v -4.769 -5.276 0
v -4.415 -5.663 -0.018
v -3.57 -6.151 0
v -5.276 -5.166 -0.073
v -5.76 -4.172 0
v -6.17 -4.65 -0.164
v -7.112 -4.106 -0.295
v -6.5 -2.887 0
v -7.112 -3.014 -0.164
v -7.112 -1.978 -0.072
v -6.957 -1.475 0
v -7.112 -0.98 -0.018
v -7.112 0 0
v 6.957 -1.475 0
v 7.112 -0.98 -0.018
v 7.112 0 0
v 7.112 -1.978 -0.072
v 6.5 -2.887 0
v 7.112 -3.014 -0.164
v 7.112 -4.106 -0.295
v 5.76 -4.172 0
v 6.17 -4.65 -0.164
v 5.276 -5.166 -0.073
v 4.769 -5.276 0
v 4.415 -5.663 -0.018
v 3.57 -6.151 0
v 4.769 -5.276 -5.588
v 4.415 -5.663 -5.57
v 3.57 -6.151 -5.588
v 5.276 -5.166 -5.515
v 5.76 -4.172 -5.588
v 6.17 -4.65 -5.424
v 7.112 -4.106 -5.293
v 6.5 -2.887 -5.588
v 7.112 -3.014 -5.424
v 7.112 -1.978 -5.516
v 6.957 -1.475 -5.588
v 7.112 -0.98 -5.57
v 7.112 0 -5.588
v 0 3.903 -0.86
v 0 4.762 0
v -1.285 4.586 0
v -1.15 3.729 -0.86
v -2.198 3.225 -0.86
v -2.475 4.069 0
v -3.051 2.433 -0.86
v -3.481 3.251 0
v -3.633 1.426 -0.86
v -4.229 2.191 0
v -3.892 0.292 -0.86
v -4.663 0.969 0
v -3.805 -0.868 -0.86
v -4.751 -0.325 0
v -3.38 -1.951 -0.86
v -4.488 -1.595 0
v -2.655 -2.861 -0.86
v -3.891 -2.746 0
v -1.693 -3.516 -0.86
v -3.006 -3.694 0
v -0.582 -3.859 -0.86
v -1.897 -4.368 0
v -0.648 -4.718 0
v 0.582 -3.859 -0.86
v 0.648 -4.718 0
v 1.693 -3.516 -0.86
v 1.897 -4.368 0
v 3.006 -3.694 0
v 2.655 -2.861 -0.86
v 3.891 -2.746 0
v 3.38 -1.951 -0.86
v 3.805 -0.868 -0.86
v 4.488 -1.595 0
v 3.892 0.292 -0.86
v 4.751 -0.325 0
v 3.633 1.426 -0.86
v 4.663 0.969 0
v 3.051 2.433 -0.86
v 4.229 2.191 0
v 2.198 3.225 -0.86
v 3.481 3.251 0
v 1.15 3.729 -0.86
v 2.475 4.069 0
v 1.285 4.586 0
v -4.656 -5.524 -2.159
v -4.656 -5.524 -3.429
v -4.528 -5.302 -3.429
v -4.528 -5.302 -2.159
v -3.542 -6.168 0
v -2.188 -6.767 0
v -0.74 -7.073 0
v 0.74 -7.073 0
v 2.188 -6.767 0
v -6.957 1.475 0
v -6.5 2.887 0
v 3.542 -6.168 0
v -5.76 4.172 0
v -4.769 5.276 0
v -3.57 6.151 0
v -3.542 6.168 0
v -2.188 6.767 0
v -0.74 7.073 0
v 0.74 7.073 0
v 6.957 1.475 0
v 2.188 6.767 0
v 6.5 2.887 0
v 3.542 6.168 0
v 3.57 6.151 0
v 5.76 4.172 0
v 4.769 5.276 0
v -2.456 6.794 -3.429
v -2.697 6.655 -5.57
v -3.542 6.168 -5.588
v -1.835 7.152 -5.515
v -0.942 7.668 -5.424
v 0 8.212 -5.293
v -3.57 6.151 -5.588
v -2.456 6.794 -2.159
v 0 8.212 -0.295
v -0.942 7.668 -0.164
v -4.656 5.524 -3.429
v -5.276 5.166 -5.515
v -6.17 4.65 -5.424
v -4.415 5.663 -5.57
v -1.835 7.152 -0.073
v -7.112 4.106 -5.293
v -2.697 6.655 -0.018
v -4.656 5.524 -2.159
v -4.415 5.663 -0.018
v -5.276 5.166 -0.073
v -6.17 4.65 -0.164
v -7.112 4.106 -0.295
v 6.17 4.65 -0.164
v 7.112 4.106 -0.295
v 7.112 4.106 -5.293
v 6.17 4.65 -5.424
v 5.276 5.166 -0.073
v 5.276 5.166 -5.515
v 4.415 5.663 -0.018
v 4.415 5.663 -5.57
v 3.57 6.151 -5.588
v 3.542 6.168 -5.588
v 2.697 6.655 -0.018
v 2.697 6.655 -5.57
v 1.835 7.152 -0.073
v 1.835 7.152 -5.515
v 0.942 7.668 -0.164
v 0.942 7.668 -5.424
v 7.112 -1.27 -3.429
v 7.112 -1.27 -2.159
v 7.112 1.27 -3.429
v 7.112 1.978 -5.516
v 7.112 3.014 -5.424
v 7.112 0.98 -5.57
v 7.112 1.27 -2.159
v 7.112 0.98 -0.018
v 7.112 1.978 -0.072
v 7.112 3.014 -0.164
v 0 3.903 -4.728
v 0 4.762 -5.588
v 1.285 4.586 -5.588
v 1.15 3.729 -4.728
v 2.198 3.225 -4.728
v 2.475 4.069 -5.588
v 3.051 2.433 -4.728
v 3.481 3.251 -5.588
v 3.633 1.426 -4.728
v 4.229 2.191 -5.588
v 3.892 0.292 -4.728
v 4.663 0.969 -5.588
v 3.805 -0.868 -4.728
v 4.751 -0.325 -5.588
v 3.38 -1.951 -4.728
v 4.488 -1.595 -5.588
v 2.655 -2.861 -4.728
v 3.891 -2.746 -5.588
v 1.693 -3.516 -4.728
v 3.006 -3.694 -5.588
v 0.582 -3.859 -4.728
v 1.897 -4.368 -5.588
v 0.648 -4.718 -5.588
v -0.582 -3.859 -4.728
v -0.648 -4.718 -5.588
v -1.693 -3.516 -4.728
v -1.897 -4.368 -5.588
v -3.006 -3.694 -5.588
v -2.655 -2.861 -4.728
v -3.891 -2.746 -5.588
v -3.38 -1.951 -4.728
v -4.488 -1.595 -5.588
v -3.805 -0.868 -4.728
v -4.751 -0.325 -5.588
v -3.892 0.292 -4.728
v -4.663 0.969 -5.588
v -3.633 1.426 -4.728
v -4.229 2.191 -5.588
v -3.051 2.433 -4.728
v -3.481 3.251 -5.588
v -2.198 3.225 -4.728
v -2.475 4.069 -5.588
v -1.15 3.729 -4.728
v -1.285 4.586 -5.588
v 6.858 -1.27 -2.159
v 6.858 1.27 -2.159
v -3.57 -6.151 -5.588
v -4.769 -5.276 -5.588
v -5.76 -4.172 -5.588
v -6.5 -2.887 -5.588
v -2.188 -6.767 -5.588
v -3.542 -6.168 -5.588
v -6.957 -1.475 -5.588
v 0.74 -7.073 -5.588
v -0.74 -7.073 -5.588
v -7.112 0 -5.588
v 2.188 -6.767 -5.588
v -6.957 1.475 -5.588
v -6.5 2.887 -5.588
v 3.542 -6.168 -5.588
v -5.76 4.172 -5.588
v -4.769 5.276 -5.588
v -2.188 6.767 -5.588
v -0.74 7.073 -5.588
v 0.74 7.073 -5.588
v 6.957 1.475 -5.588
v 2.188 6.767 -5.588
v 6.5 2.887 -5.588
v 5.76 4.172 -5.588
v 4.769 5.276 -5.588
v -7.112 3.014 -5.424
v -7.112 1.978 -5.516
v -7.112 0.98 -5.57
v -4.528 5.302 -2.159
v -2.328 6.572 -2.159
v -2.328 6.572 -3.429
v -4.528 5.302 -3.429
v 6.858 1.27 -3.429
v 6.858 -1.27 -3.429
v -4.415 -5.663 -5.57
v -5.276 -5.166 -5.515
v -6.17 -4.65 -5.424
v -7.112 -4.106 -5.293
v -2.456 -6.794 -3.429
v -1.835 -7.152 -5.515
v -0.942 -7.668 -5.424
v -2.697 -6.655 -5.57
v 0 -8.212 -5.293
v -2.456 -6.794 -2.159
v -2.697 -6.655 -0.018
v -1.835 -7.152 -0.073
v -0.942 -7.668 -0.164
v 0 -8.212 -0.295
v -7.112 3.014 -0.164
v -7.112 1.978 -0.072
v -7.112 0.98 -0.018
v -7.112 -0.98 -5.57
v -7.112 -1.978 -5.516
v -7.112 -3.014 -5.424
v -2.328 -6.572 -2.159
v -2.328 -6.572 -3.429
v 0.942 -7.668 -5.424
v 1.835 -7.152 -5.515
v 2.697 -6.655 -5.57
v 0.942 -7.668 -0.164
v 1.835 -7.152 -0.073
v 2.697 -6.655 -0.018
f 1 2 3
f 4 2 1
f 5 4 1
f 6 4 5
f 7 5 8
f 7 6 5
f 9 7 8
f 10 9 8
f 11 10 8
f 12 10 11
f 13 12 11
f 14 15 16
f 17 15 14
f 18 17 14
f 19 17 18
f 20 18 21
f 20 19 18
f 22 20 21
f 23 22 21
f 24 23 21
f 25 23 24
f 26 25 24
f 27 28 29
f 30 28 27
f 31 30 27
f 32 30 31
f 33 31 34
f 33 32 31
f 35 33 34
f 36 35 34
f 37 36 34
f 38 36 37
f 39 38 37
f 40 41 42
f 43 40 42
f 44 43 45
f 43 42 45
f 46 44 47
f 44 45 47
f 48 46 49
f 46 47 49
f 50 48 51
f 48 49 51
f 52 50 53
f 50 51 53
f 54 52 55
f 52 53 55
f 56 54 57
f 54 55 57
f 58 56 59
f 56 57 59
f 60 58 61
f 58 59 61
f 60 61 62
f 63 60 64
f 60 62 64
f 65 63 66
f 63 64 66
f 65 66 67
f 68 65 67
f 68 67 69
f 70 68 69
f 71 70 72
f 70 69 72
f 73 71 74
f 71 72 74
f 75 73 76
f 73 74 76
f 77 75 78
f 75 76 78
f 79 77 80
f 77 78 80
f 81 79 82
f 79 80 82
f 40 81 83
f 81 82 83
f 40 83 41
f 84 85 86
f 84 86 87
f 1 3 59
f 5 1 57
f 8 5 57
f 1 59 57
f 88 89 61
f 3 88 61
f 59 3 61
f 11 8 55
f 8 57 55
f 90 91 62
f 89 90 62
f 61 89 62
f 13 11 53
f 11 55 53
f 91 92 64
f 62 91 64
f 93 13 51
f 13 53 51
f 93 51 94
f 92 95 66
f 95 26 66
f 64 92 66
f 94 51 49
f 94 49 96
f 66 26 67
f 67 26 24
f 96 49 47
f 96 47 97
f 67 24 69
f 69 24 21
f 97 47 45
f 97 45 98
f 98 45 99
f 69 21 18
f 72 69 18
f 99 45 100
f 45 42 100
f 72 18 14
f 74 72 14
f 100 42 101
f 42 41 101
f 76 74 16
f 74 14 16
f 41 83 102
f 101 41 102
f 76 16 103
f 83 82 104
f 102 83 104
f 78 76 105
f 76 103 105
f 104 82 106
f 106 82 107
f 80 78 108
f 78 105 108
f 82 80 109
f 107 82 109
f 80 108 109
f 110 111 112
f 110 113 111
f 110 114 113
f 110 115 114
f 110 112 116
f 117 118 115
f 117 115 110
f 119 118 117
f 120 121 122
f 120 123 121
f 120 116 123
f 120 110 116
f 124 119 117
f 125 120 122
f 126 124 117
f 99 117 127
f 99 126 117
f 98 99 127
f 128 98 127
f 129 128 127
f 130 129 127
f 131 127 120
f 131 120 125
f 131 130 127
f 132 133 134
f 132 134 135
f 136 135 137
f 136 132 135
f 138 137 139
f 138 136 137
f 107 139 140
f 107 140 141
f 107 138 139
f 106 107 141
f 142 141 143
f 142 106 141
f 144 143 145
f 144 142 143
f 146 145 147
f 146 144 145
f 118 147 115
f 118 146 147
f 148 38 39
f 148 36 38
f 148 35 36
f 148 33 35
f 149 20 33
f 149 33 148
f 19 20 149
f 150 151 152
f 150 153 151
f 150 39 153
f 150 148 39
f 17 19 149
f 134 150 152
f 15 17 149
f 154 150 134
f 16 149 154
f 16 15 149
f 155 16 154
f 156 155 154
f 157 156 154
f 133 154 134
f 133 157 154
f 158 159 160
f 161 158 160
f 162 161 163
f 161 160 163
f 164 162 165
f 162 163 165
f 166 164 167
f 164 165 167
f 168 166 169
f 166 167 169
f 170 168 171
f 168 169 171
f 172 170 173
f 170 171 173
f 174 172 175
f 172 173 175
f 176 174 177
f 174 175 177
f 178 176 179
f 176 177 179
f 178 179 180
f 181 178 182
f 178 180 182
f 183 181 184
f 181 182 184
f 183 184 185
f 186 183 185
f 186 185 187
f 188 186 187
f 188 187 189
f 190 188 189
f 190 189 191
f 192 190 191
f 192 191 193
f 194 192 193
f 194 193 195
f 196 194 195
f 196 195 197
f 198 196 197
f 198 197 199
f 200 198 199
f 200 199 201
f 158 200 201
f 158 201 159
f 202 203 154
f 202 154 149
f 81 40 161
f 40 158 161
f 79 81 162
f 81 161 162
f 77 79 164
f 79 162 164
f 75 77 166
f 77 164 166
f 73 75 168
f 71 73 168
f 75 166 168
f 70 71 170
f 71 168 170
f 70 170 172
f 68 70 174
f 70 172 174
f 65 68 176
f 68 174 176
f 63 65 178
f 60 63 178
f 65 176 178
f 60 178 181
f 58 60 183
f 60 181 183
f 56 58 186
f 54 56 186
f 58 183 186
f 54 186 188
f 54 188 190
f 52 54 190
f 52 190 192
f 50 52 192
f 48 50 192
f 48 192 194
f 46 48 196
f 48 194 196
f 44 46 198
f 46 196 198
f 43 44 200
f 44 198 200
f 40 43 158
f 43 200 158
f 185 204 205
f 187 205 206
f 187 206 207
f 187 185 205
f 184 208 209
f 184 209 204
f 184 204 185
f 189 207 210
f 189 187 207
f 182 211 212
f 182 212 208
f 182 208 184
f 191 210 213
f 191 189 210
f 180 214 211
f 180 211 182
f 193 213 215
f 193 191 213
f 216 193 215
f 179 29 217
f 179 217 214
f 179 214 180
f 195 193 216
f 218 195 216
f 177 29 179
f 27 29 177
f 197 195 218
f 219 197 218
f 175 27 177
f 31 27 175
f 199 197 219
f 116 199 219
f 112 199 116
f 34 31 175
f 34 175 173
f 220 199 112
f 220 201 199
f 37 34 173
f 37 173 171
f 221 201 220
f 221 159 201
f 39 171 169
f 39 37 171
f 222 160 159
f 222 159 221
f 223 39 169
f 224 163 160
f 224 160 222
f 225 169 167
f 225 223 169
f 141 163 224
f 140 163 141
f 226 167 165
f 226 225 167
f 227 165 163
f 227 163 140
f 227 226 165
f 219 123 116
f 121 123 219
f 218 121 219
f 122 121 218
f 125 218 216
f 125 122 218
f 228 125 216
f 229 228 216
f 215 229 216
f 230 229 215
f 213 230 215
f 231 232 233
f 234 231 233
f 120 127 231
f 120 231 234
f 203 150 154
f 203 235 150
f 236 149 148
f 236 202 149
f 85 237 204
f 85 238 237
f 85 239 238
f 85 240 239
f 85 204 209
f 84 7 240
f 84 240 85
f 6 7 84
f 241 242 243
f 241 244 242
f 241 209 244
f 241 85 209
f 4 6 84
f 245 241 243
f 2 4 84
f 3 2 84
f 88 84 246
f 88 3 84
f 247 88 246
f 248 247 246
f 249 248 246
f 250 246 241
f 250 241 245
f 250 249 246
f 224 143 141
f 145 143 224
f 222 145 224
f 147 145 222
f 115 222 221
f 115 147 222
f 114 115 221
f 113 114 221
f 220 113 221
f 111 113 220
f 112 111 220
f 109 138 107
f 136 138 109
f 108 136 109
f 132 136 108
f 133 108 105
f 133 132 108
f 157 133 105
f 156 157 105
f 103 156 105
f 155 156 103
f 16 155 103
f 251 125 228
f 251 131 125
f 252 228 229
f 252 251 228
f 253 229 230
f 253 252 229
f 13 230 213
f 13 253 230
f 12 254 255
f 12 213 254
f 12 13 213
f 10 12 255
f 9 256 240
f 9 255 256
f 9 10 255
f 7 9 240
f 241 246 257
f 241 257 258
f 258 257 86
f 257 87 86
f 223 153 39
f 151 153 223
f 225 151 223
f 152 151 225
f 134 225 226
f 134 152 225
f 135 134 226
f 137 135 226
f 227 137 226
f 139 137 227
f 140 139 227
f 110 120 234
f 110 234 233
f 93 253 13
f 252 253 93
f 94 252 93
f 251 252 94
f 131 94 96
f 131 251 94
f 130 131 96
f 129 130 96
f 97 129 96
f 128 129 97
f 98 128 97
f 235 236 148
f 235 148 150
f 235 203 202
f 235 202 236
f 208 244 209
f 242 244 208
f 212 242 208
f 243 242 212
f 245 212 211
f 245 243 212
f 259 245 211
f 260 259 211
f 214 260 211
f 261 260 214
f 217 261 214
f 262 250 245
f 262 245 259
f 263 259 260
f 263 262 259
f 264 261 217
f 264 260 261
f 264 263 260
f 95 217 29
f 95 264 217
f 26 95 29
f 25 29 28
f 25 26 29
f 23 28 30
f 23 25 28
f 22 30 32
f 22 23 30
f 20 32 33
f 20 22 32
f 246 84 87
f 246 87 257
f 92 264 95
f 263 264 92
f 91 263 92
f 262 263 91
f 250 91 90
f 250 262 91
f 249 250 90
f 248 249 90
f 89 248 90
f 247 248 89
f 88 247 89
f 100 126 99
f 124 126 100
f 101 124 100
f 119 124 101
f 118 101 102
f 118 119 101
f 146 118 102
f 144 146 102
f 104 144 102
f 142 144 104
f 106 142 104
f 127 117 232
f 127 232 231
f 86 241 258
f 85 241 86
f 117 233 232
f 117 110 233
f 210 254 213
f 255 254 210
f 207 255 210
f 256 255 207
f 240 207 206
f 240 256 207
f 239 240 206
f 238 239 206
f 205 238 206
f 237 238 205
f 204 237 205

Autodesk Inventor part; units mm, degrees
sketch "Sketch_1" plane through (0, 0, 0) normal (1, 0, 0) x (0, 1, 0)
  line L0 (0, -5.588) -> (0, 0)
  line L1 (4.7625, 0) -> (3.9027, -0.8598)
  line L2 (3.9027, -0.8598) -> (3.9027, -4.7282)
  line L3 (3.9027, -4.7282) -> (4.7625, -5.588)
  line L4 (4.7625, -5.588) -> (7.112, -5.588)
  line L5 (7.112, -5.588) -> (8.5344, -5.2069)
  line L6 (8.5344, -5.2069) -> (8.5344, -0.3811)
  line L7 (8.5344, -0.3811) -> (7.112, 0)
  line L8 (7.112, 0) -> (4.7625, 0)
revolve "Revolution1" add sketch "Sketch_1" angle 360 about axis through (0, 0, -5.588) along (0, 0, -1)
thread "Thread1" size "3/8-16 UNC" class "2B" standard "ANSI Unified Screw Threads" full length
sketch "Sketch_2" plane through (0, 0, 0) normal (0, 0, 1) x (1, 0, 0)
  circle A0 centre (0, 0) radius 15.24
  line L0 (-7.112, -4.1061) -> (0, -8.2122)
  line L1 (0, -8.2122) -> (7.112, -4.1061)
  line L2 (7.112, -4.1061) -> (7.112, 4.1061)
  line L3 (7.112, 4.1061) -> (0, 8.2122)
  line L4 (0, 8.2122) -> (-7.112, 4.1061)
  line L5 (-7.112, 4.1061) -> (-7.112, -4.1061)
extrude "Extrusion1" cut sketch "Sketch_2" against normal blind 5.588
sketch "Sketch_3" plane through (7.112, 0, 0) normal (1, 0, 0) x (0, 0, -1)
  line L0 (2.159, 1.27) -> (2.159, -1.27)
  line L1 (2.159, -1.27) -> (3.429, -1.27)
  line L2 (3.429, -1.27) -> (3.429, 1.27)
  line L3 (3.429, 1.27) -> (2.159, 1.27)
extrude "Extrusion2" cut sketch "Sketch_3" along normal mid plane 0.508
sketch "Sketch_4" plane through (-3.556, 6.1592, 0) normal (0.5, -0.866, 0) x (0, 0, -1)
  line L0 (2.159, 1.27) -> (2.159, -1.27)
  line L1 (2.159, -1.27) -> (3.429, -1.27)
  line L2 (3.429, -1.27) -> (3.429, 1.27)
  line L3 (3.429, 1.27) -> (2.159, 1.27)
extrude "Extrusion3" cut sketch "Sketch_4" along normal mid plane 0.508
sketch "Sketch_5" plane through (-3.556, -6.1592, 0) normal (0.5, 0.866, 0) x (0, 0, -1)
  line L0 (2.159, 1.27) -> (2.159, -1.27)
  line L1 (2.159, -1.27) -> (3.429, -1.27)
  line L2 (3.429, -1.27) -> (3.429, 1.27)
  line L3 (3.429, 1.27) -> (2.159, 1.27)
extrude "Extrusion4" cut sketch "Sketch_5" along normal mid plane 0.508
ref_plane "nut_XY" through (0, 0, 0) normal (0, 0, -1) x (1, 0, 0)
ref_plane "nut_YZ" through (0, 0, 0) normal (1, 0, 0) x (0, -1, 0)
ref_plane "nut_ZX" through (0, 0, 0) normal (0, -1, 0) x (0, 0, -1)
properties part number "2LOPRO-NUT"
